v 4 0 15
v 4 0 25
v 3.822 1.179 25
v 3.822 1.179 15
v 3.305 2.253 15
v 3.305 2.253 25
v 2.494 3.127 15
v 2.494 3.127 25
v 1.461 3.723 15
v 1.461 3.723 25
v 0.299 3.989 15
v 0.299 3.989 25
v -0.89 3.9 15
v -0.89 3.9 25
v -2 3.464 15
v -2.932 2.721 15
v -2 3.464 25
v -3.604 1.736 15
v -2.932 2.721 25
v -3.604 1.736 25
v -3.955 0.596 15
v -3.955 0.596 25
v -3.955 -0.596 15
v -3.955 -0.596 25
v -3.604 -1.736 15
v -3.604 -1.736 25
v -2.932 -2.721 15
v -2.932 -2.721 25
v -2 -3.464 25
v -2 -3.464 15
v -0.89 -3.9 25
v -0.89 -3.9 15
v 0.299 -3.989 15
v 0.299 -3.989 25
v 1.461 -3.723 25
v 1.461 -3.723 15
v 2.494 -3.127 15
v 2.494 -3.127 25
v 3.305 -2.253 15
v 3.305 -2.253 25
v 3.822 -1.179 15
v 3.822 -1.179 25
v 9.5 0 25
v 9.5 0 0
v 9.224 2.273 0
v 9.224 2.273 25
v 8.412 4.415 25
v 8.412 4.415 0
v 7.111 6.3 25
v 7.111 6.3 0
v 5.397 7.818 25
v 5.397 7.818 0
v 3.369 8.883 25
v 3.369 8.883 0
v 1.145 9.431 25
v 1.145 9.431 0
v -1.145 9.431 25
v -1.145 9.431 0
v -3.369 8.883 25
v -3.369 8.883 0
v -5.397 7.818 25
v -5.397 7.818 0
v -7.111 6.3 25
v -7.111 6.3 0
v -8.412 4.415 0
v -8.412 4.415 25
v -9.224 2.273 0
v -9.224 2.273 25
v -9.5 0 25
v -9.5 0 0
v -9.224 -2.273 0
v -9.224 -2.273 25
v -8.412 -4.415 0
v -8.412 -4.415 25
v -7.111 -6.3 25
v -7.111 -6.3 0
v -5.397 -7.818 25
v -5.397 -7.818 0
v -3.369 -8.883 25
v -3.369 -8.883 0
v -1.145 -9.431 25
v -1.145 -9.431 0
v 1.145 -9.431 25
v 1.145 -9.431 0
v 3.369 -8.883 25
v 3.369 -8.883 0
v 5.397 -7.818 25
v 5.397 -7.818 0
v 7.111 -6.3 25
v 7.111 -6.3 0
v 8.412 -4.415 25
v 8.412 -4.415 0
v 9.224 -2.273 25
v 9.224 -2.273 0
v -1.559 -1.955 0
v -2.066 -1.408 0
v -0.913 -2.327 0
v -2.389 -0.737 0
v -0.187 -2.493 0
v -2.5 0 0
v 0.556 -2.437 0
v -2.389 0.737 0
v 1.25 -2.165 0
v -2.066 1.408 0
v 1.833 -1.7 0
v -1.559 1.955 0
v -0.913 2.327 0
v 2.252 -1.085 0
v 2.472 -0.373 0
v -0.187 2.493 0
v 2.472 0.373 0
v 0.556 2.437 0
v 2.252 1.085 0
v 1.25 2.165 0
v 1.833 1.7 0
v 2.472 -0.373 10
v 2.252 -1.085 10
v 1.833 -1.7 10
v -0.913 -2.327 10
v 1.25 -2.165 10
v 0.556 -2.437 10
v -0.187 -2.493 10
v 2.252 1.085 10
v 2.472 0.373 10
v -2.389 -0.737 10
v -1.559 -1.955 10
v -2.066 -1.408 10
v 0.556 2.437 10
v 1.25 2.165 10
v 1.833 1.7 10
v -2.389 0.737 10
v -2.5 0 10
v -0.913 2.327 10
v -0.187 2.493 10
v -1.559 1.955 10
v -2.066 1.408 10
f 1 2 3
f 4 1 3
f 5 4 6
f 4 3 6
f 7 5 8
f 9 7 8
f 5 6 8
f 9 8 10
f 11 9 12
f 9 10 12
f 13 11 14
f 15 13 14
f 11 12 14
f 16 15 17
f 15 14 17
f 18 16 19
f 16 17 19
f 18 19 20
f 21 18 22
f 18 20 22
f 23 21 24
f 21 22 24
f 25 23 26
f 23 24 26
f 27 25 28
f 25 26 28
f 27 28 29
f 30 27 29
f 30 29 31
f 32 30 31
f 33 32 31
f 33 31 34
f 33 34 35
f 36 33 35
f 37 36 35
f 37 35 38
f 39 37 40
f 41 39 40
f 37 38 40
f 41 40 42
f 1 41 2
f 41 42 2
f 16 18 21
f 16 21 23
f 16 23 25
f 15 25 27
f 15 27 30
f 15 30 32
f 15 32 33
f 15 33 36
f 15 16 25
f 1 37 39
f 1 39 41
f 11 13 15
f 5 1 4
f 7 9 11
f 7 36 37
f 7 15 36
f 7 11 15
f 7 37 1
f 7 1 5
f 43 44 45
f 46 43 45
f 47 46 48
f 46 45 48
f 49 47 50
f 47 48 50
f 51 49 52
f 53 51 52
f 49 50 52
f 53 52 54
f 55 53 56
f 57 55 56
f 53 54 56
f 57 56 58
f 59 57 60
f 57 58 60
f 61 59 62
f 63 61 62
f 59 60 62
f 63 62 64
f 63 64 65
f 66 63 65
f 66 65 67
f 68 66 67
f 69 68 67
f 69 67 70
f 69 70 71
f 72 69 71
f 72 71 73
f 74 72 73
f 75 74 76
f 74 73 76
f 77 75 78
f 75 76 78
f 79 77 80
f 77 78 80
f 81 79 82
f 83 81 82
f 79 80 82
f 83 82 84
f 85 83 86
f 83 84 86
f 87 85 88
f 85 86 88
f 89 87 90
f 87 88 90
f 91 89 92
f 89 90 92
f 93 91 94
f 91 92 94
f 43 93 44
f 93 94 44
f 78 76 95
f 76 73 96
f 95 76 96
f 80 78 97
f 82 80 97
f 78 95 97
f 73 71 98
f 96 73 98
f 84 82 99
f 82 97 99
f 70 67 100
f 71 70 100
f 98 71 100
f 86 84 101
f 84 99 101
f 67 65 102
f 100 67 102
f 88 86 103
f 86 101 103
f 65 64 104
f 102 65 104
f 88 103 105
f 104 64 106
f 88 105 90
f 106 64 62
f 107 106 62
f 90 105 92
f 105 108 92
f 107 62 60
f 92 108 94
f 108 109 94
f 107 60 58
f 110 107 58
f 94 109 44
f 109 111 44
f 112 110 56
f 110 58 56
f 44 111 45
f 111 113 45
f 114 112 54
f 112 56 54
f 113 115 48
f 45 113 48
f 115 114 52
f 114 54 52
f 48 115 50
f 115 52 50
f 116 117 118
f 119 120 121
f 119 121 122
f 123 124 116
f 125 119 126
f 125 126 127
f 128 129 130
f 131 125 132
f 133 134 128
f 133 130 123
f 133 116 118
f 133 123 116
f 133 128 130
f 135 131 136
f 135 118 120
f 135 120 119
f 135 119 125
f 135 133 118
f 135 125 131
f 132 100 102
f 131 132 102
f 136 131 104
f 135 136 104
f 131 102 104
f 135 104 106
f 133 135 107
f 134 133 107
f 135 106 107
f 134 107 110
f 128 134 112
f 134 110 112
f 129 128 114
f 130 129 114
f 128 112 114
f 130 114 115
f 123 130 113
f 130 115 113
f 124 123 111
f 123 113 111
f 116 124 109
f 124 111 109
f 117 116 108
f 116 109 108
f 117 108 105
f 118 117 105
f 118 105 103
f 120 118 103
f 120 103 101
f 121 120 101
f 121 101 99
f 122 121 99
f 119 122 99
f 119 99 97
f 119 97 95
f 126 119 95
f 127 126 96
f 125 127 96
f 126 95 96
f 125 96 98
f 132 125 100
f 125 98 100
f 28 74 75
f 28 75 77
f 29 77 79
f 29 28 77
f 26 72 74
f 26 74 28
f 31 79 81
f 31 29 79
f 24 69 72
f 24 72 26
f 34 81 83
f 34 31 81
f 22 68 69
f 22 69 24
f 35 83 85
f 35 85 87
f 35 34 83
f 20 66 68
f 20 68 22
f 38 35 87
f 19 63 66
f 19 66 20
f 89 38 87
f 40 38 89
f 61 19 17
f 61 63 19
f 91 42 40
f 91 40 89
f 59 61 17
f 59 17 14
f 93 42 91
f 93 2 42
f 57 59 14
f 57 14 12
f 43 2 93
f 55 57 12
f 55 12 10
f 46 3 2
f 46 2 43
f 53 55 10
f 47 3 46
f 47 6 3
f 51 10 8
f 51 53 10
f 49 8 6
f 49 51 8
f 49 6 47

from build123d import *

# Parameters (mm, degrees)
SKETCH1_R           = 9.5
BOSS_EXTRUDE1_DEPTH = 25
SKETCH2_R           = 4
CUT_EXTRUDE1_DEPTH  = 10
SKETCH3_R           = 2.5
CUT_EXTRUDE2_DEPTH  = 10


with BuildPart() as part:
    # Sketch1 → Boss-Extrude1 (new body)
    with BuildSketch(Plane.XY):
        Circle(SKETCH1_R)
    extrude(amount=BOSS_EXTRUDE1_DEPTH)

    # Sketch2 → Cut-Extrude1 (cut)
    with BuildSketch(Plane.XY.offset(25)):
        Circle(SKETCH2_R)
    extrude(amount=-CUT_EXTRUDE1_DEPTH, mode=Mode.SUBTRACT)

    # Sketch3 → Cut-Extrude2 (cut)
    with BuildSketch(Plane(origin=(0, 0, 0), x_dir=(-1, 0, 0), z_dir=(0, 0, -1))):
        Circle(SKETCH3_R)
    extrude(amount=-CUT_EXTRUDE2_DEPTH, mode=Mode.SUBTRACT)


solid = part.part
